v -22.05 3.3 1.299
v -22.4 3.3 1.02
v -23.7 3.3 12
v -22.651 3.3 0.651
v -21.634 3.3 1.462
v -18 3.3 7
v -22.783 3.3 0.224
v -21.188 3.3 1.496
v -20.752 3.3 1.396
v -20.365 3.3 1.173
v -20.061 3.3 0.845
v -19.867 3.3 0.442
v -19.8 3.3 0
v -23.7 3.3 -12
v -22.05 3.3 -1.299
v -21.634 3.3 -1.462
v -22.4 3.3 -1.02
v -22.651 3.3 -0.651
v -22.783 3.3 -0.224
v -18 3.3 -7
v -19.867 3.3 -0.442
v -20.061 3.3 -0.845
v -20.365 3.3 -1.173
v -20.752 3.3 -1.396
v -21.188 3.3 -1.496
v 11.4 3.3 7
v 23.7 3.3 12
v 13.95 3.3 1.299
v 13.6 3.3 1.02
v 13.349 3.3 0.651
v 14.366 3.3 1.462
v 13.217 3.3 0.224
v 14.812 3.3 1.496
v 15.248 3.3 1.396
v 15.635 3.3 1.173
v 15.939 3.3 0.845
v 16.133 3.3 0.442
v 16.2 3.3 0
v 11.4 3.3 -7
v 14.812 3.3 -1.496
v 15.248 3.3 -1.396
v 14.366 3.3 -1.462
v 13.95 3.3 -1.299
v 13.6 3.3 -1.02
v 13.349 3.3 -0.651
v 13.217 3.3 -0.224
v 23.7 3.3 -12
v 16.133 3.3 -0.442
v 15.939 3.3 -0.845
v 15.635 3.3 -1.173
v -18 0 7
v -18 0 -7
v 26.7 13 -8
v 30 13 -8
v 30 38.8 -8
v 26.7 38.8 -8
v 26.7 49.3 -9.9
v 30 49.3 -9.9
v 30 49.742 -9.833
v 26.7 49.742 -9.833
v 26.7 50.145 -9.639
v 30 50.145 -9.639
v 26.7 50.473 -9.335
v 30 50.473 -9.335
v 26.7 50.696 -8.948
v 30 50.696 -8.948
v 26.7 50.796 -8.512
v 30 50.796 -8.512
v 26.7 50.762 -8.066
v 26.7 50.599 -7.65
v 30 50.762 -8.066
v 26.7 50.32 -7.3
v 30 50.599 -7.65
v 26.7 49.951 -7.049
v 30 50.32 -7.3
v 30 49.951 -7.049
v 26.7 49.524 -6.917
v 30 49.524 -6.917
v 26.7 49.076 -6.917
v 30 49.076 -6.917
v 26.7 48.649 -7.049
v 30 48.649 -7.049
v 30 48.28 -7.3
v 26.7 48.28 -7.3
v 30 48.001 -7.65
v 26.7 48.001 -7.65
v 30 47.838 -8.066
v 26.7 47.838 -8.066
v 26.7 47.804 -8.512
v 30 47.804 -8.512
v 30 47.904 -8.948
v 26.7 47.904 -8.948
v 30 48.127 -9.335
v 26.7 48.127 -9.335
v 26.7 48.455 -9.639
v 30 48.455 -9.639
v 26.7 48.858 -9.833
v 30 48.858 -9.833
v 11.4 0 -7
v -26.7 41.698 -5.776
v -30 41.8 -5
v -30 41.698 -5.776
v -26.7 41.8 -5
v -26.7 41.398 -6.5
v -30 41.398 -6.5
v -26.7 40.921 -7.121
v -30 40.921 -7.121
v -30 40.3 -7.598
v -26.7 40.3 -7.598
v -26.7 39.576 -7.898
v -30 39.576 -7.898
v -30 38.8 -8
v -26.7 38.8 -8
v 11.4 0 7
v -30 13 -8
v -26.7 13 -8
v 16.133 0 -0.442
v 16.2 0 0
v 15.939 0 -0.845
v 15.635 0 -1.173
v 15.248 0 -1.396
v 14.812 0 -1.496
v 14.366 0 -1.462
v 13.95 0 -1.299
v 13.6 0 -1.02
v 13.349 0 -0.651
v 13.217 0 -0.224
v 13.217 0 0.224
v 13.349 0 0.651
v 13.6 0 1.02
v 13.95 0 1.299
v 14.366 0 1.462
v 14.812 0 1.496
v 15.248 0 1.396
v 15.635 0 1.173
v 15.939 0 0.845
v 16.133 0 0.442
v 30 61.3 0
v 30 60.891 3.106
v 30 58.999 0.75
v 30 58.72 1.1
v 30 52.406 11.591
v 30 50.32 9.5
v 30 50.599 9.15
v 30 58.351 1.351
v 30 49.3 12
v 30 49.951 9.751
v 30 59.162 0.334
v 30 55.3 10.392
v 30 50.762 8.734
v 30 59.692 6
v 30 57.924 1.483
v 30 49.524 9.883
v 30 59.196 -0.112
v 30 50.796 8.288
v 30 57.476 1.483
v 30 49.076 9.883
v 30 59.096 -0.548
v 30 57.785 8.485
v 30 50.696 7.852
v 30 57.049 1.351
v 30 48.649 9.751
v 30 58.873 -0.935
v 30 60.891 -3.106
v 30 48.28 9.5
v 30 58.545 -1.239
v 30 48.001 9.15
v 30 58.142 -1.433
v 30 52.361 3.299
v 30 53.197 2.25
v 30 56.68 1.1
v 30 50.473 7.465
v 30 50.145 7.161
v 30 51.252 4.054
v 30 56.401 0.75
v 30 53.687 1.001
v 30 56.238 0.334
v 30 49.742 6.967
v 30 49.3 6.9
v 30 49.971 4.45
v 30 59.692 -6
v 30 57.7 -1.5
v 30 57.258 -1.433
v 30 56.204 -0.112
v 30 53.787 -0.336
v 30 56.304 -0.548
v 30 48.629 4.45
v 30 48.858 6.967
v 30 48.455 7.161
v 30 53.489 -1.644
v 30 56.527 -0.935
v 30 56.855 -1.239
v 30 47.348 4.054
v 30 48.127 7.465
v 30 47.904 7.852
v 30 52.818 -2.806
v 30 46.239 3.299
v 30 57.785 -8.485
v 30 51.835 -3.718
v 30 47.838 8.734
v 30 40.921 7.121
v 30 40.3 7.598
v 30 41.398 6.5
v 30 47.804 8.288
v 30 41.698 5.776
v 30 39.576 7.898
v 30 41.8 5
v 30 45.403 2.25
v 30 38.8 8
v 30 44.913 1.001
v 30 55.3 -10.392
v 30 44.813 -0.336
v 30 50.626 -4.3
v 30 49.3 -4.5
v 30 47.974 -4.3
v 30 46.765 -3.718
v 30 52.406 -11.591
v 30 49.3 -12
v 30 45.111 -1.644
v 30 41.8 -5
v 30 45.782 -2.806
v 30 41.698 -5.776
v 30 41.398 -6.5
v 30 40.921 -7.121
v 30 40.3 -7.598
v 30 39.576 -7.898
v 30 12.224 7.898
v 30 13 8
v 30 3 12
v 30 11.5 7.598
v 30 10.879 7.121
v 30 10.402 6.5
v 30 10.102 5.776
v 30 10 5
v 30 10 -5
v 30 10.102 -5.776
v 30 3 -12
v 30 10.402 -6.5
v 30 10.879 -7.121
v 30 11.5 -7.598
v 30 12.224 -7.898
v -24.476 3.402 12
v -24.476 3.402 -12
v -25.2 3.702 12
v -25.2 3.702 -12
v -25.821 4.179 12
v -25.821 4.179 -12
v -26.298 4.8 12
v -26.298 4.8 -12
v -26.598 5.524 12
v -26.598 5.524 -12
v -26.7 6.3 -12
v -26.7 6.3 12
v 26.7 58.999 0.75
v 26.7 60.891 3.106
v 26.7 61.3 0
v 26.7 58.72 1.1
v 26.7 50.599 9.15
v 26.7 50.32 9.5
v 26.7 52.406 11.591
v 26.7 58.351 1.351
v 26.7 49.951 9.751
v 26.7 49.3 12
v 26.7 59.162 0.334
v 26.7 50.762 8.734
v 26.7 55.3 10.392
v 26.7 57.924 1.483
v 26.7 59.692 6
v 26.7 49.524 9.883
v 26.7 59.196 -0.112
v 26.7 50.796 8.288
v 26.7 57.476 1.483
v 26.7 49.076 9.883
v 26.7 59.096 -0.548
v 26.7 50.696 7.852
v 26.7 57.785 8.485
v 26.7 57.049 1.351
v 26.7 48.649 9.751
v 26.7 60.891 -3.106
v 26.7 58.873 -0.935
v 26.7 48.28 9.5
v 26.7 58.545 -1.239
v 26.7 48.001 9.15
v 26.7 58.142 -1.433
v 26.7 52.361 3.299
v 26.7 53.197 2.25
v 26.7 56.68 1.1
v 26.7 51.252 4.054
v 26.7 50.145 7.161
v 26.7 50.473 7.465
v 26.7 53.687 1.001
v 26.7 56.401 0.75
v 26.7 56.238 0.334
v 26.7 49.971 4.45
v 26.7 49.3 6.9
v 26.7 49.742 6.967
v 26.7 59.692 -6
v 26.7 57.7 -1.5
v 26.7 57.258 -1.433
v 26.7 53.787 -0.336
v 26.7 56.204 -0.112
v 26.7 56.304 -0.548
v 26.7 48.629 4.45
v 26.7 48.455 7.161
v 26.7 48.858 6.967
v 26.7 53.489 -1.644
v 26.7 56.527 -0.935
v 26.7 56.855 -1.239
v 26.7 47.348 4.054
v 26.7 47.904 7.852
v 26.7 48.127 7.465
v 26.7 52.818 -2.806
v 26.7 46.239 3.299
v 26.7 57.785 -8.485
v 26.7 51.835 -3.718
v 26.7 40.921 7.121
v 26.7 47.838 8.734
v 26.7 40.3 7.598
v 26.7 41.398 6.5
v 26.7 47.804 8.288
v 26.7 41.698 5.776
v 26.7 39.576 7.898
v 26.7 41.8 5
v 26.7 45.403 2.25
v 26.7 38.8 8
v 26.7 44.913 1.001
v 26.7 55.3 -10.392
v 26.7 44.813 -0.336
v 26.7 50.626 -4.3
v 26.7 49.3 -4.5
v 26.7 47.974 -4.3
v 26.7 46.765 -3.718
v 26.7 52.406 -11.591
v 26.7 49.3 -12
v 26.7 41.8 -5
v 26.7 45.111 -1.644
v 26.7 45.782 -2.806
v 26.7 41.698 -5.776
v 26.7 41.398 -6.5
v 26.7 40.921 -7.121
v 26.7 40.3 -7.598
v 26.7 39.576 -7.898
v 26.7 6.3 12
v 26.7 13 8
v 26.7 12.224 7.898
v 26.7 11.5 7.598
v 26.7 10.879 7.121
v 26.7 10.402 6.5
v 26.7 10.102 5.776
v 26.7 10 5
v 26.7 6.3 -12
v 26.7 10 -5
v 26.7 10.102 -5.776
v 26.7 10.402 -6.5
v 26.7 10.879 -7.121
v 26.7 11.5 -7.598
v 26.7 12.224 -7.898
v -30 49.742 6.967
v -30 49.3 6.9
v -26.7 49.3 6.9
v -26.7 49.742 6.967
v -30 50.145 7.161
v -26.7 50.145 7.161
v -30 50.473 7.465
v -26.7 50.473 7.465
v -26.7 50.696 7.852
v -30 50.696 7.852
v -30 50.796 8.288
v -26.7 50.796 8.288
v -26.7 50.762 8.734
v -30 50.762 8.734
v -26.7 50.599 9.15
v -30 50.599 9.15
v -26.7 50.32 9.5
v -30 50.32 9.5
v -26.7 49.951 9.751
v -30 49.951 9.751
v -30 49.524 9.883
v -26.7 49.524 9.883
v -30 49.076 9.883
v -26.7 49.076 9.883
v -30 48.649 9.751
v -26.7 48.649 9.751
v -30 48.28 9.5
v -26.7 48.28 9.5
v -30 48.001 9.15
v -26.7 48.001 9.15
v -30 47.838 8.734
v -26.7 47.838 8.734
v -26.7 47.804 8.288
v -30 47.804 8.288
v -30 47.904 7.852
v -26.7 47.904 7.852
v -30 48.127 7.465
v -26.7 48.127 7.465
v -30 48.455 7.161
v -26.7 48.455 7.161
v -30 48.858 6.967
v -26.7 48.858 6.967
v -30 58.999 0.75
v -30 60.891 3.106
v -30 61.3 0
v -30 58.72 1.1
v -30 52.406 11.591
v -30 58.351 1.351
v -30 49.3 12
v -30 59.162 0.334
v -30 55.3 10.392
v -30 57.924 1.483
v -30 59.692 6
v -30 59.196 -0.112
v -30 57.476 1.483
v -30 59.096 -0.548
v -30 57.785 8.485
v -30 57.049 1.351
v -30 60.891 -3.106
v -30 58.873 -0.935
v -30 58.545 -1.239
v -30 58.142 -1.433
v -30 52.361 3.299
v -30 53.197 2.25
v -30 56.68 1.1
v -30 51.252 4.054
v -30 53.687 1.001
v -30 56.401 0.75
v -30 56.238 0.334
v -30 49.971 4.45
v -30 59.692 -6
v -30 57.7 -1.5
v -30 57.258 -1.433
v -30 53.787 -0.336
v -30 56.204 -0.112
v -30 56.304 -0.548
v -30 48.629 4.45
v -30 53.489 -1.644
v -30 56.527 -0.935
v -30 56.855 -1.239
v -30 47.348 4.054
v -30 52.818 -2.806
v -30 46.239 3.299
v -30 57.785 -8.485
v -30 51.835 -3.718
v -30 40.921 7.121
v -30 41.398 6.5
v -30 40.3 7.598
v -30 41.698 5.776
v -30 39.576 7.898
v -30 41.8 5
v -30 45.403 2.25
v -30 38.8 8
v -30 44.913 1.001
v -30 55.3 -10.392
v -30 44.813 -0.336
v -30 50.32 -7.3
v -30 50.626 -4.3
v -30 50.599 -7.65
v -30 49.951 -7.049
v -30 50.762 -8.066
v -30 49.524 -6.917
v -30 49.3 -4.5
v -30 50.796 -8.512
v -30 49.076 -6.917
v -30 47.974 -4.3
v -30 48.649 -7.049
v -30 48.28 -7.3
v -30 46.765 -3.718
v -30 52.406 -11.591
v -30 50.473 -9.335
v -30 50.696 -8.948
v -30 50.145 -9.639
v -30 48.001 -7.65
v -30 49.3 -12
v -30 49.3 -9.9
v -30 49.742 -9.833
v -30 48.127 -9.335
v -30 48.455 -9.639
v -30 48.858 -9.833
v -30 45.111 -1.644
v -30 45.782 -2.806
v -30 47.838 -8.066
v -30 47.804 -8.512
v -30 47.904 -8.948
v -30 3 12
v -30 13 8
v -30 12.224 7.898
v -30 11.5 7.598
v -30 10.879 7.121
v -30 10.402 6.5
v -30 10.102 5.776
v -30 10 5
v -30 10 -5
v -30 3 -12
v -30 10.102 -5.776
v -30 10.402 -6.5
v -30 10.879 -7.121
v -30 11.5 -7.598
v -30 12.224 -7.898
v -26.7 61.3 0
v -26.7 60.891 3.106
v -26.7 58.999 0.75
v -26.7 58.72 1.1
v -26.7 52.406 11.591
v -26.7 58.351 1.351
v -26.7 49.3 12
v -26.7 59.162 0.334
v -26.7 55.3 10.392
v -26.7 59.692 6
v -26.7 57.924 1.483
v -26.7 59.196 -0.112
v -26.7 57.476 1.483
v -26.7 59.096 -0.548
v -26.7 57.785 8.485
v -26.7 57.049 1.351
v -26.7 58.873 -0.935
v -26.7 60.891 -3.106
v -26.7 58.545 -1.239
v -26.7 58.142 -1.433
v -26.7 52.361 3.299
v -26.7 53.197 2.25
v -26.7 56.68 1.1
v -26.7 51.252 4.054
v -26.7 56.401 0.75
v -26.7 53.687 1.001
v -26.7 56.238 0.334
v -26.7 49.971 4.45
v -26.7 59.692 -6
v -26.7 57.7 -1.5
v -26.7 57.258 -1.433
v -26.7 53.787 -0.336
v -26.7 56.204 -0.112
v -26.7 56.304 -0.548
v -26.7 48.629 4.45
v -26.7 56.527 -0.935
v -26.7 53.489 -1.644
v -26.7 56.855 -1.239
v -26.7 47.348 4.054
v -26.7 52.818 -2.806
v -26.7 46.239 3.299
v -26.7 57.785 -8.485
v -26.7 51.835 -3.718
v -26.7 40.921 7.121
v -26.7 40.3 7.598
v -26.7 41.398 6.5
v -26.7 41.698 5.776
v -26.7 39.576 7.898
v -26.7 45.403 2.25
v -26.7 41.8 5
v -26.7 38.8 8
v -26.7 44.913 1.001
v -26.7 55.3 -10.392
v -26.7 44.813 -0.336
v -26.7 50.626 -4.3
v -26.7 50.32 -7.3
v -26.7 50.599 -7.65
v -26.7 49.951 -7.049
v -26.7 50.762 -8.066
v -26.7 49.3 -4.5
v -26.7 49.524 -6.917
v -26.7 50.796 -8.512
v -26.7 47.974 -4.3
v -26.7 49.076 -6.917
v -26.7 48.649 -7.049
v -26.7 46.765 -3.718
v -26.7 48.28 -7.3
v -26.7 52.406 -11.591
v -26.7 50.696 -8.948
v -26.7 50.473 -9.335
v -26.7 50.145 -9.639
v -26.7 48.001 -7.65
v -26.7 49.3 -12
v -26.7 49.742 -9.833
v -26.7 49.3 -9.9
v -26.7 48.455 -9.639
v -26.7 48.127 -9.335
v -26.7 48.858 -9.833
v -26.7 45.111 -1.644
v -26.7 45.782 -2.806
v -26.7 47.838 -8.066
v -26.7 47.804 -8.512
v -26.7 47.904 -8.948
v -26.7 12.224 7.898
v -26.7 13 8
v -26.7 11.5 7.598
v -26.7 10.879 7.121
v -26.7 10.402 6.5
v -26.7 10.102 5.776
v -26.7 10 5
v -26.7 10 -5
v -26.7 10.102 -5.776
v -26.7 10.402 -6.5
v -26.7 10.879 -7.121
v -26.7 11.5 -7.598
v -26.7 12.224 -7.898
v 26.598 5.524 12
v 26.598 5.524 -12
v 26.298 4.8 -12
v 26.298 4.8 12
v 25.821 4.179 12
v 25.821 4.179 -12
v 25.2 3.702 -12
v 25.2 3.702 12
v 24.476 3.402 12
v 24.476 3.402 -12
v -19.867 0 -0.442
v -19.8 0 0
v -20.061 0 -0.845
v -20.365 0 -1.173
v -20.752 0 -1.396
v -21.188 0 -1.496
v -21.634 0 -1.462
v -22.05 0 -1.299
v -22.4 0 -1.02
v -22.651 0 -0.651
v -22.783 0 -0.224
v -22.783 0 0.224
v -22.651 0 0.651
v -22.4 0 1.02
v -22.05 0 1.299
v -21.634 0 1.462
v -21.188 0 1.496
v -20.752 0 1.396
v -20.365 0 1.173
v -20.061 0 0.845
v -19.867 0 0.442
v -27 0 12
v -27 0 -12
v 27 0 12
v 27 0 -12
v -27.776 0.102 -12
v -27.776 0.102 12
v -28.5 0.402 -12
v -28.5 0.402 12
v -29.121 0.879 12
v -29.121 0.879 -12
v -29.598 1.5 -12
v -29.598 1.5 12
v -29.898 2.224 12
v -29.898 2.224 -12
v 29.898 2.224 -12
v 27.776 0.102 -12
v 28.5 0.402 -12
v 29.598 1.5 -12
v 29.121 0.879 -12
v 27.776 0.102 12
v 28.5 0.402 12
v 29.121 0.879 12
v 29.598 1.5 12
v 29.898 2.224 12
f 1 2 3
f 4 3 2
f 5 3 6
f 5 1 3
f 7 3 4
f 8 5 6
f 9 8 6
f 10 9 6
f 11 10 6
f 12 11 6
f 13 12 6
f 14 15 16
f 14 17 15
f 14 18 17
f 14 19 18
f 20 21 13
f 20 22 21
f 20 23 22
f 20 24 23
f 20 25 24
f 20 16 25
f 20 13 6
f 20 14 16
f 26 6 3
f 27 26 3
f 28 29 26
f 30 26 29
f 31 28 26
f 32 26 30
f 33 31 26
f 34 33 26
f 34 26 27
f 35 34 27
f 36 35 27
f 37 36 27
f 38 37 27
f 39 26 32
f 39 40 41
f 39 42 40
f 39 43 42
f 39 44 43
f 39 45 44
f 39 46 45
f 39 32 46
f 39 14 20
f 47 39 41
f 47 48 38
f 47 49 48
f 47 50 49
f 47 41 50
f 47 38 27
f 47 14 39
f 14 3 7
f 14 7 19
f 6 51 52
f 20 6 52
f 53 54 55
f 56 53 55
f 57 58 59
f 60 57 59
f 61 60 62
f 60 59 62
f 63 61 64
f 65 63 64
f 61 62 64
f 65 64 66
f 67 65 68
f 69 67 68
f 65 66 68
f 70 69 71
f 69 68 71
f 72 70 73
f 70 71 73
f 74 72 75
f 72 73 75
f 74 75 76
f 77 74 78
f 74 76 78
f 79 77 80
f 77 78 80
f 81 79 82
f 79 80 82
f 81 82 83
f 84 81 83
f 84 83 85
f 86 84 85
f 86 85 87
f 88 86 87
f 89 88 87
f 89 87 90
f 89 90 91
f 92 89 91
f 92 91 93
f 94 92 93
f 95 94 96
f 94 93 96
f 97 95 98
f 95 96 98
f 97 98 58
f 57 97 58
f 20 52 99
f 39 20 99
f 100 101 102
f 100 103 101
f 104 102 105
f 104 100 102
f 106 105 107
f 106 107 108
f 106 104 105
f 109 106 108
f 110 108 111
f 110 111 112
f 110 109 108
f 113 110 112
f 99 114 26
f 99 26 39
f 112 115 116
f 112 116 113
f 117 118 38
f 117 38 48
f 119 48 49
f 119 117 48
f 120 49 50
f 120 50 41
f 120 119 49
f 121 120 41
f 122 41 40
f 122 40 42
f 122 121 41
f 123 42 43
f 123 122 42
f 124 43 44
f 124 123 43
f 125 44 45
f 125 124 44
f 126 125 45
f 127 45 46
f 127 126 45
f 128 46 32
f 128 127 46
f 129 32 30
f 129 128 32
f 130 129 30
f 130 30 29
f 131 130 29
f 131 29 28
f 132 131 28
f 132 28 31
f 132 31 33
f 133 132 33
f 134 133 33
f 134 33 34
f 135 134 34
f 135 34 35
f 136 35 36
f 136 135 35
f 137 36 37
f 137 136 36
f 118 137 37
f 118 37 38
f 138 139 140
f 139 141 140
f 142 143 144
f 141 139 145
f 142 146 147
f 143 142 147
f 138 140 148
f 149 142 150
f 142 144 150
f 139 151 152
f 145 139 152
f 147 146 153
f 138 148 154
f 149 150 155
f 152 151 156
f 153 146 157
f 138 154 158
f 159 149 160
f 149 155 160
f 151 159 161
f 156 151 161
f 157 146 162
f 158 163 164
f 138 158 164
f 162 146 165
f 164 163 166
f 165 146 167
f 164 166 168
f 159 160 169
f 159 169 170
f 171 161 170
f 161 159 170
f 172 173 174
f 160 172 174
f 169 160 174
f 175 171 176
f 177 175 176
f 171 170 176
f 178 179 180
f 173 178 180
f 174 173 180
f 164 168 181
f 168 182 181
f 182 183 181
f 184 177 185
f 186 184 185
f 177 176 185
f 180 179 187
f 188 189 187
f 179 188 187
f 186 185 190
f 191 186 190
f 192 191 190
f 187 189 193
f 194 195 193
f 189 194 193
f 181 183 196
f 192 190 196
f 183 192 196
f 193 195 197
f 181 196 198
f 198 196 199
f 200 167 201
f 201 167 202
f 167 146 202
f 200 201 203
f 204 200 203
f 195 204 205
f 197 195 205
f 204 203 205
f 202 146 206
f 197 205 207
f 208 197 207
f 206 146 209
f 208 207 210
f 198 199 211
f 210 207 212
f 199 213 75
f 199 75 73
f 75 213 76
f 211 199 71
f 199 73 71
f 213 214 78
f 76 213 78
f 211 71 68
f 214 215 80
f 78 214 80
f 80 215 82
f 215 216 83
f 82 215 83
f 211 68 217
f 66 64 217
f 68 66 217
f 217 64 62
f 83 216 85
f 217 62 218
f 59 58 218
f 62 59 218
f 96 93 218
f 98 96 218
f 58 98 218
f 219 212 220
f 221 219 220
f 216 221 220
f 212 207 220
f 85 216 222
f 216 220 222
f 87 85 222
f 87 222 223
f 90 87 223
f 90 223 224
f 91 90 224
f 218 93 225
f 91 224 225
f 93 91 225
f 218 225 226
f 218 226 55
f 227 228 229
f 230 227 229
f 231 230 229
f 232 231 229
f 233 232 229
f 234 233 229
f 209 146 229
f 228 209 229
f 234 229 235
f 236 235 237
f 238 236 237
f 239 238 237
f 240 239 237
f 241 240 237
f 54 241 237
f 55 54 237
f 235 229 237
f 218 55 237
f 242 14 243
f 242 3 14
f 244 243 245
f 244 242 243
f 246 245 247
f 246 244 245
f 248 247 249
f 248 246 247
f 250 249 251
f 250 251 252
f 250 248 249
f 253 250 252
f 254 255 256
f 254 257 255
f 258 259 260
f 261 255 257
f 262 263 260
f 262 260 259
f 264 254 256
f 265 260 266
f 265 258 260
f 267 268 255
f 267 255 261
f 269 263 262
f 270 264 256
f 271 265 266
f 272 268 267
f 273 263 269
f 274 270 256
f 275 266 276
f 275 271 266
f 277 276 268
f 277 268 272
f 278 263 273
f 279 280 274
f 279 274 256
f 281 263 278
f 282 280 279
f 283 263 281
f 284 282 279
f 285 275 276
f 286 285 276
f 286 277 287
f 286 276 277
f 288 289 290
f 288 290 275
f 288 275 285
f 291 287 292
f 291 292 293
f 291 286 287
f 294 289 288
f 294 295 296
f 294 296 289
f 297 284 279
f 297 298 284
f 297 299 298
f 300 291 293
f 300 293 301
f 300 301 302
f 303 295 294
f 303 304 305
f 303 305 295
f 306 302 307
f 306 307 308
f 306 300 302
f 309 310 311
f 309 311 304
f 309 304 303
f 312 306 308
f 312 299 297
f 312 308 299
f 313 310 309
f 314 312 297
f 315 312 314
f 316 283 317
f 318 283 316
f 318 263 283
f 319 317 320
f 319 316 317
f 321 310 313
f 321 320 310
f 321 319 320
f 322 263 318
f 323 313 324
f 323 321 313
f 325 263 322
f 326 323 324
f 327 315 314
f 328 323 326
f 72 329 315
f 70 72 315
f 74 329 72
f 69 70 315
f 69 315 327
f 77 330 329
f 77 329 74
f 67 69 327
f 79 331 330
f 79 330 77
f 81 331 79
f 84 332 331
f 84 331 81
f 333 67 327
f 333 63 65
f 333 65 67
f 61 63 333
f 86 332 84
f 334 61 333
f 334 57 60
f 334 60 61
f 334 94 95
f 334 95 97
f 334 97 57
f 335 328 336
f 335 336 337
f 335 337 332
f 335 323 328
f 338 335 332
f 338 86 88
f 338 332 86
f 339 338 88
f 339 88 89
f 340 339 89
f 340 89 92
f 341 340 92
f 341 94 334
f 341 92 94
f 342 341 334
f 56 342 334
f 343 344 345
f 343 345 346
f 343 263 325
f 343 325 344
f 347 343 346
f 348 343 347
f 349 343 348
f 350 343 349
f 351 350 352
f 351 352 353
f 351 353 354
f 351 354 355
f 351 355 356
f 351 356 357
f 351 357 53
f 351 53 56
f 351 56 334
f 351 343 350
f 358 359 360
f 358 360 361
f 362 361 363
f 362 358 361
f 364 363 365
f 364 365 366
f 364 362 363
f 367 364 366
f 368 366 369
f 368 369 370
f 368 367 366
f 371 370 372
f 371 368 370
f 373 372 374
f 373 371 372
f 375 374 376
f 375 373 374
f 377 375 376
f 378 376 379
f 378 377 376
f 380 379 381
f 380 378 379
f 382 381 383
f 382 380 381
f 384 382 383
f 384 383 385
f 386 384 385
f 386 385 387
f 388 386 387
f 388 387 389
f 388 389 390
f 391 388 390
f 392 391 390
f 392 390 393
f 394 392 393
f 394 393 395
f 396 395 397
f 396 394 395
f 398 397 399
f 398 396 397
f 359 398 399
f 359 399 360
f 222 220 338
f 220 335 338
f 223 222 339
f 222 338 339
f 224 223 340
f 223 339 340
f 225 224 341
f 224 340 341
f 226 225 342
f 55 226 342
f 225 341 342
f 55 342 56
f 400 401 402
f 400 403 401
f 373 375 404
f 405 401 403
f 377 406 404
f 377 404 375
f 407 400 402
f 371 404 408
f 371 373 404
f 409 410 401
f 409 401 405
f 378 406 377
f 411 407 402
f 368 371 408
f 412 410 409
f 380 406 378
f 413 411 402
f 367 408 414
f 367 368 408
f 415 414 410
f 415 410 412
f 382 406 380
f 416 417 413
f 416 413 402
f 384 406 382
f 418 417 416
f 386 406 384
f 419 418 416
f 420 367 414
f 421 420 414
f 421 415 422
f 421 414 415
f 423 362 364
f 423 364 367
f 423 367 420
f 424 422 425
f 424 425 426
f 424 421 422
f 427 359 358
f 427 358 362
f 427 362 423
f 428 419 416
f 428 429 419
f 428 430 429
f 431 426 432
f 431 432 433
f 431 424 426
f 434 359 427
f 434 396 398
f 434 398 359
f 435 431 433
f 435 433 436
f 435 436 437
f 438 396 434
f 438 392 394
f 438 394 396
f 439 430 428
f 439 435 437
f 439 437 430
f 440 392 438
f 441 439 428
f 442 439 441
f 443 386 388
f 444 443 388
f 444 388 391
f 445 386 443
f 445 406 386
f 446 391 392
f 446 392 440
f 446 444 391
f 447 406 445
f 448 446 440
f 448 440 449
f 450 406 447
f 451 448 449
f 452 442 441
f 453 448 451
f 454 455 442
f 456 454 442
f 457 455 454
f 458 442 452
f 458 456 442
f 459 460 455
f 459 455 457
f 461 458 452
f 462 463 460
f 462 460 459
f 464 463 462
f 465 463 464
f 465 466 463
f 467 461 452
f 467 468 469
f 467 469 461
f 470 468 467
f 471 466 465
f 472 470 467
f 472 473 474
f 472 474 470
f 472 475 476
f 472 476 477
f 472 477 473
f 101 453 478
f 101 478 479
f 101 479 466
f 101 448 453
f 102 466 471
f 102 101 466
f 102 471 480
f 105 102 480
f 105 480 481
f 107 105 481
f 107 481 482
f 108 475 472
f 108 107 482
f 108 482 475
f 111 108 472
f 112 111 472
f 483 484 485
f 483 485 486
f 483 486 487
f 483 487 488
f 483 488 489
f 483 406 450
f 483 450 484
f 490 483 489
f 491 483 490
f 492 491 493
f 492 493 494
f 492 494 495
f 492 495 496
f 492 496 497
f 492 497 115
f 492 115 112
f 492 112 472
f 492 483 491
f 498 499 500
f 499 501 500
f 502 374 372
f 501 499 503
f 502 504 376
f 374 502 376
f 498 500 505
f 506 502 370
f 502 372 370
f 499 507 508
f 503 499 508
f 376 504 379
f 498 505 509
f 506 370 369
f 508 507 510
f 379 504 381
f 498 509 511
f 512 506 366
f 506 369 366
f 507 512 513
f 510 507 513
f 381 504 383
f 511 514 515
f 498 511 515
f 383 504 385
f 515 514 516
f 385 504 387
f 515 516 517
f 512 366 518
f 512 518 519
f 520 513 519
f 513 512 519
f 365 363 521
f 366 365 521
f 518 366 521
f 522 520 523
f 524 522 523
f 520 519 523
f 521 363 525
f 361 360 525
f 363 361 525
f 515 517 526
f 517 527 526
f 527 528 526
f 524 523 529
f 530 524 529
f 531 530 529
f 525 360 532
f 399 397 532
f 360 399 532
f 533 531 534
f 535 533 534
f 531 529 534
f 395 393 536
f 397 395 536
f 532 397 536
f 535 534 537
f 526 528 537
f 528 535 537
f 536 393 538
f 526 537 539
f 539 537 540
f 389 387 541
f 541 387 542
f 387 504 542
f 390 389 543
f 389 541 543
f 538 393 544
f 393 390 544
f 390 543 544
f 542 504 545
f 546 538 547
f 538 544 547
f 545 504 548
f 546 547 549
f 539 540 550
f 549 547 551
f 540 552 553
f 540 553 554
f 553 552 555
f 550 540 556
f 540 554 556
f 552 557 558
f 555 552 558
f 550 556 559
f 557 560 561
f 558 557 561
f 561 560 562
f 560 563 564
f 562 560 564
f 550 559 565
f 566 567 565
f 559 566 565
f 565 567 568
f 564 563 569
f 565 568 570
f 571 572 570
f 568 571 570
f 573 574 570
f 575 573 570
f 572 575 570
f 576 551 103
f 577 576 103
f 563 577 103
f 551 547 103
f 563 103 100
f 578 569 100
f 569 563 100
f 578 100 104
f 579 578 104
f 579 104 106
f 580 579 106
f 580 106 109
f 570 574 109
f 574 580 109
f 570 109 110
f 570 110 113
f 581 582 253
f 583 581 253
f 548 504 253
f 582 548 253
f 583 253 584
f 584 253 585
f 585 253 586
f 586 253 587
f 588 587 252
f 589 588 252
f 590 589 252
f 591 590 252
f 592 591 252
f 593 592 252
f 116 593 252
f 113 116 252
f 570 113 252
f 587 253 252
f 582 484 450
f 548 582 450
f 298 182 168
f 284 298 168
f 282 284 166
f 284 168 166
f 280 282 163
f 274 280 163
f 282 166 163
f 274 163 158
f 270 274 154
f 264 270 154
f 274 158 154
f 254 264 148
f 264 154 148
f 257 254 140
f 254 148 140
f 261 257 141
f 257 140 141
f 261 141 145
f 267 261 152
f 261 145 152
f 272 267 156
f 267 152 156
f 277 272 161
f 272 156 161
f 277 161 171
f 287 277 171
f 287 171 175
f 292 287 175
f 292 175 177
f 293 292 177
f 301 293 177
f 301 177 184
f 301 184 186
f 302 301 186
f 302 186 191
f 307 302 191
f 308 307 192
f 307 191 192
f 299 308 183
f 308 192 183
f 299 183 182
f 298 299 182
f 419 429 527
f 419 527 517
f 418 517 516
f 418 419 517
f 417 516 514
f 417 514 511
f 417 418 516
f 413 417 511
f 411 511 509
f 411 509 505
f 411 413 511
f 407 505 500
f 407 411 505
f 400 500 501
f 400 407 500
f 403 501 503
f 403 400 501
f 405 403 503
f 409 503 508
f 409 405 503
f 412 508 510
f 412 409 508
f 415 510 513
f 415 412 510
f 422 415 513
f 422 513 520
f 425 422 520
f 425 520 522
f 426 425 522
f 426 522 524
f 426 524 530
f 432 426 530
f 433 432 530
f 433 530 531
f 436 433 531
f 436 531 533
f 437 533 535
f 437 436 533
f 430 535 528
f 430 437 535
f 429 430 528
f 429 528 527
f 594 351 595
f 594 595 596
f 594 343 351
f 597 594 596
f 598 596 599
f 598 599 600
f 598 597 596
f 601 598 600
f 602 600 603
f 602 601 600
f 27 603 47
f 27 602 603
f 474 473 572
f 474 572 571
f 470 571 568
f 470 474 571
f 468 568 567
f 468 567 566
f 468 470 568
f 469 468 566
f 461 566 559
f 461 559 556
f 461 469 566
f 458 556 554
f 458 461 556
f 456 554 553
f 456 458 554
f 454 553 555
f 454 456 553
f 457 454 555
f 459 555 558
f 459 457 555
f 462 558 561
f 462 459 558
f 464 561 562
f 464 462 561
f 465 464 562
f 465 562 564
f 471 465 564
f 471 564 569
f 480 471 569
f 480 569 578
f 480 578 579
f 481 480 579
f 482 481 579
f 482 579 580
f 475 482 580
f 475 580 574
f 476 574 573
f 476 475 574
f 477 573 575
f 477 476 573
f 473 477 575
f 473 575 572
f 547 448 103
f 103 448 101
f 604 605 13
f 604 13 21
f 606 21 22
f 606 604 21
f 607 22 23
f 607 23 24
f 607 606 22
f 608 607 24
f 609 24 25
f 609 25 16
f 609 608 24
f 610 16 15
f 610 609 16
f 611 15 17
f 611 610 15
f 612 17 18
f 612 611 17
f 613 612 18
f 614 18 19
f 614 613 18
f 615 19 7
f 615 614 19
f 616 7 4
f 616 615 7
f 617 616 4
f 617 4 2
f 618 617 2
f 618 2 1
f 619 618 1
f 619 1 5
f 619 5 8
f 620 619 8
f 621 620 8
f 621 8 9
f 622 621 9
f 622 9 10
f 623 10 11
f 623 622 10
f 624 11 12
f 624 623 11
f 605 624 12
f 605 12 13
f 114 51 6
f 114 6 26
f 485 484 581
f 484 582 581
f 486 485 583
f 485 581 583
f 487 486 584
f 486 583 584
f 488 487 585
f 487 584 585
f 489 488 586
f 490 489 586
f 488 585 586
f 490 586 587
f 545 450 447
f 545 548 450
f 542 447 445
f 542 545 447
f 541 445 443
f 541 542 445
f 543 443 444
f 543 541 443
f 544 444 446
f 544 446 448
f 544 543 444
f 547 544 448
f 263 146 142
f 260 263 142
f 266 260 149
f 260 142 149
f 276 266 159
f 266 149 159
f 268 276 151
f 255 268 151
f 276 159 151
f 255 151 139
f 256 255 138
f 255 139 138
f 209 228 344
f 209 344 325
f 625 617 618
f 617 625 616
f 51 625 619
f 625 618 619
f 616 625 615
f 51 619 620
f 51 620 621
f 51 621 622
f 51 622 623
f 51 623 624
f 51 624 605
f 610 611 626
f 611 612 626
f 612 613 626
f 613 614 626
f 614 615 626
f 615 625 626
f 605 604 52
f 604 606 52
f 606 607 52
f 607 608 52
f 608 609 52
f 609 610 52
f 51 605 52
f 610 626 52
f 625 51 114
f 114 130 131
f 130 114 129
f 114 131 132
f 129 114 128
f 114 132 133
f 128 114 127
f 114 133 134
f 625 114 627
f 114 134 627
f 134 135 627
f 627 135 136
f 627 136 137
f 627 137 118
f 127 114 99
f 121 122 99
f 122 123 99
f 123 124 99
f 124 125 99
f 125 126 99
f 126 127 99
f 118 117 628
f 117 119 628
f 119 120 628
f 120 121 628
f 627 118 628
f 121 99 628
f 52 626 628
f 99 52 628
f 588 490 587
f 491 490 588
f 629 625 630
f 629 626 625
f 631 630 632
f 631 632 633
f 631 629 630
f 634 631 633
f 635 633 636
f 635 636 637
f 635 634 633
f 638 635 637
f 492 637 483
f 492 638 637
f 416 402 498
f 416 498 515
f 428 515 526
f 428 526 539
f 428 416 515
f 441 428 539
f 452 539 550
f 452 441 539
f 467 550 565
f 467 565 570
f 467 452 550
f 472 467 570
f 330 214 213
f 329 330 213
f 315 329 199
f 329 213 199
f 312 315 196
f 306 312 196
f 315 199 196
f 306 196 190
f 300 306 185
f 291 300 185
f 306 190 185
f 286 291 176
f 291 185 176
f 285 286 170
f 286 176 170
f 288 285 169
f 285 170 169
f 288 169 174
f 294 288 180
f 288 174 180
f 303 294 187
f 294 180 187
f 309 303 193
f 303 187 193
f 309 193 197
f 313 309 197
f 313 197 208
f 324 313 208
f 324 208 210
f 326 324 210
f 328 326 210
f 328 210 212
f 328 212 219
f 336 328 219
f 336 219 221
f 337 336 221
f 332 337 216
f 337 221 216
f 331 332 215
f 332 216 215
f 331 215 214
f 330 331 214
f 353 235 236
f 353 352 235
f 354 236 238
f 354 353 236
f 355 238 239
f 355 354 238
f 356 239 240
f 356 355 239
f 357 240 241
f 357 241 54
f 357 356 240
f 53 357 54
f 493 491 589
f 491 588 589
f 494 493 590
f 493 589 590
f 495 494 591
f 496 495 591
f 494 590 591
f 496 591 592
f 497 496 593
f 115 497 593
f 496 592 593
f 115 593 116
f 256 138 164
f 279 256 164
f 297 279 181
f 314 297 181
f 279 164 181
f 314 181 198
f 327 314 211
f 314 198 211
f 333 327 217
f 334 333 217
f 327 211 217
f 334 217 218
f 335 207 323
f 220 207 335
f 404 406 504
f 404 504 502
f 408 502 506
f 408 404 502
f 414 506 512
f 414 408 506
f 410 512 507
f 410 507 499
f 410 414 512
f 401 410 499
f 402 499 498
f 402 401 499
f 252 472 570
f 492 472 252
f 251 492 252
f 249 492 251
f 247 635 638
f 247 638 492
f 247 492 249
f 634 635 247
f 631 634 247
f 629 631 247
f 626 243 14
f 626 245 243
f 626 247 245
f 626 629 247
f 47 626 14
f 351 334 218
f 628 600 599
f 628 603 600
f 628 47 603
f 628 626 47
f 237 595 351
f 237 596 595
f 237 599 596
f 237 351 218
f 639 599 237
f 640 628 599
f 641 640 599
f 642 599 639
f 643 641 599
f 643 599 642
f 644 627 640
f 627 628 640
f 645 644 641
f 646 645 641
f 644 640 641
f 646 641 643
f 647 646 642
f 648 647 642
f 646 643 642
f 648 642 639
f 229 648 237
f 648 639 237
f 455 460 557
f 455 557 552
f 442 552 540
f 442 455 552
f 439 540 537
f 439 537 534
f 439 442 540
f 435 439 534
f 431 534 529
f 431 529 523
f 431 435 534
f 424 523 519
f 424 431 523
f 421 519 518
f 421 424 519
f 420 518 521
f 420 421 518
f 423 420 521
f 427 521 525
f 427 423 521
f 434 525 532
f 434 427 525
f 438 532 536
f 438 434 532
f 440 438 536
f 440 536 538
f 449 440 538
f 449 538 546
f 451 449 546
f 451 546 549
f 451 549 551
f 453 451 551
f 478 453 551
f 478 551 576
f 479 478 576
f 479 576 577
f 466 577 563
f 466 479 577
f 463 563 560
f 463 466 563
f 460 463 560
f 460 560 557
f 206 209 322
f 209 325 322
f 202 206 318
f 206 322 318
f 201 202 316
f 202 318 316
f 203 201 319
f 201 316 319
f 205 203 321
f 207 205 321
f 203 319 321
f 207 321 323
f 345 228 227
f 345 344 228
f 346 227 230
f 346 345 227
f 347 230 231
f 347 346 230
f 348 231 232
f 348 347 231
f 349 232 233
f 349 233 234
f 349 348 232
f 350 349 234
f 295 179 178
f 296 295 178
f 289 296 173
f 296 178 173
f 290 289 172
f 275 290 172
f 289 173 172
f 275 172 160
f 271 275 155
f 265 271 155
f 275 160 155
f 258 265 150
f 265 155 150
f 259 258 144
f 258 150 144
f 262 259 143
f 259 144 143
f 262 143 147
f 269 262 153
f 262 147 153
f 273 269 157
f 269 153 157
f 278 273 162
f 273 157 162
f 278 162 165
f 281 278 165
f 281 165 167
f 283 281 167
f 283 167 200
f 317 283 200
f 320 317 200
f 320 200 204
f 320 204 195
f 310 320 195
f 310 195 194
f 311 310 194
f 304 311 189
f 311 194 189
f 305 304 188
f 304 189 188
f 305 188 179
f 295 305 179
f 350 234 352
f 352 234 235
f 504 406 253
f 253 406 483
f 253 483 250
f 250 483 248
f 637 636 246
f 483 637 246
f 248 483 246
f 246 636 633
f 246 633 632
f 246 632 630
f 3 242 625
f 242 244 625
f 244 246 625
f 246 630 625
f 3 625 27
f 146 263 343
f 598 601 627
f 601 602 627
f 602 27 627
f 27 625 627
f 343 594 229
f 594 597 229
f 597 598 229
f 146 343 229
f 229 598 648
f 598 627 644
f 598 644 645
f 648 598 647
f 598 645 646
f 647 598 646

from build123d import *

# Parameters (mm, degrees)
SKETCH1_W           = 60
SKETCH1_H           = 24
BOSS_EXTRUDE1_DEPTH = 3.3
SKETCH2_W           = 3.3
SKETCH2_H           = 24
BOSS_EXTRUDE2_DEPTH = 61.3
SKETCH3_W           = 16
SKETCH3_H           = 31.8
CUT_EXTRUDE1_DEPTH  = 3.3
CUT_EXTRUDE2_DEPTH  = 3.3
SKETCH5_R           = 4.5
SKETCH5_R_2         = 1.5
CUT_EXTRUDE3_DEPTH  = 3.3
SKETCH7_R           = 1.5
SKETCH7_W           = 29.4
SKETCH7_H           = 14
CUT_EXTRUDE4_DEPTH  = 3.3
FILLET1_R           = 3


with BuildPart() as part:
    # Sketch1 → Boss-Extrude1 (new body)
    with BuildSketch(Plane(origin=(0, 0, 0), x_dir=(1, 0, 0), z_dir=(0, 1, 0))):
        Rectangle(SKETCH1_W, SKETCH1_H)
    extrude(amount=BOSS_EXTRUDE1_DEPTH)

    # Sketch2 → Boss-Extrude2 (add)
    with BuildSketch(Plane(origin=(0, 0, 0), x_dir=(1, 0, 0), z_dir=(0, 1, 0))):
        with Locations((28.35, 0)):
            Rectangle(SKETCH2_W, SKETCH2_H)
    boss_extrude2 = extrude(amount=BOSS_EXTRUDE2_DEPTH)

    # Sketch3 → Cut-Extrude1 (cut)
    with BuildSketch(Plane(origin=(30, 0, 0), x_dir=(0, 0, -1), z_dir=(1, 0, 0))):
        with Locations((0, 25.9)):
            Rectangle(SKETCH3_W, SKETCH3_H)
    cut_extrude1 = extrude(amount=-CUT_EXTRUDE1_DEPTH, mode=Mode.SUBTRACT)

    # Sketch4 → Cut-Extrude2 (cut)
    with BuildSketch(Plane(origin=(30, 0, 0), x_dir=(0, 0, -1), z_dir=(1, 0, 0))):
        with BuildLine():
            ThreePointArc((2.4e-08, 61.3), (8.485281383, 57.785281366), (12, 49.3))
            Line((12, 49.3), (12, 61.3))
            Line((12, 61.3), (2.4e-08, 61.3))
        make_face()
        with BuildLine():
            ThreePointArc((-12, 49.3), (-8.485281366, 57.785281383), (2.4e-08, 61.3))
            Line((2.4e-08, 61.3), (-12, 61.3))
            Line((-12, 61.3), (-12, 49.3))
        make_face()
    cut_extrude2 = extrude(amount=-CUT_EXTRUDE2_DEPTH, mode=Mode.SUBTRACT)

    # Sketch5 → Cut-Extrude3 (cut)
    with BuildSketch(Plane(origin=(30, 0, 0), x_dir=(0, 0, -1), z_dir=(1, 0, 0))):
        with Locations((0, 49.3)):
            Circle(SKETCH5_R)
        with Locations((8.4, 49.3)):
            Circle(SKETCH5_R_2)
        with Locations((0, 57.7)):
            Circle(SKETCH5_R_2)
        with Locations((-8.4, 49.3)):
            Circle(SKETCH5_R_2)
    cut_extrude3 = extrude(amount=-CUT_EXTRUDE3_DEPTH, mode=Mode.SUBTRACT)

    # Sketch7 → Cut-Extrude4 (cut)
    with BuildSketch(Plane(origin=(0, 0, 0), x_dir=(1, 0, 0), z_dir=(0, 1, 0))):
        with Locations((-21.3, 0)):
            Circle(SKETCH7_R)
        with Locations((14.7, 0)):
            Circle(SKETCH7_R)
        with Locations((-3.3, 0)):
            Rectangle(SKETCH7_W, SKETCH7_H)
    extrude(amount=CUT_EXTRUDE4_DEPTH, mode=Mode.SUBTRACT)

    # Mirror2: Boss-Extrude2, Cut-Extrude1, Cut-Extrude2, Cut-Extrude3 across plane
    add(boss_extrude2.mirror(Plane(origin=(0, 0, 0), x_dir=(0, 0, 1), z_dir=(1, 0, 0))))
    add(cut_extrude1.mirror(Plane(origin=(0, 0, 0), x_dir=(0, 0, 1), z_dir=(1, 0, 0))), mode=Mode.SUBTRACT)
    add(cut_extrude2.mirror(Plane(origin=(0, 0, 0), x_dir=(0, 0, 1), z_dir=(1, 0, 0))), mode=Mode.SUBTRACT)
    add(cut_extrude3.mirror(Plane(origin=(0, 0, 0), x_dir=(0, 0, 1), z_dir=(1, 0, 0))), mode=Mode.SUBTRACT)

    # Fillet1
    fillet1_edges = [part.edges().sort_by_distance(p)[0] for p in [
        (-26.7, 3.3, 0),
        (-28.35, 10, 8),
        (-28.35, 41.8, 8),
        (-28.35, 41.8, -8),
        (-28.35, 10, -8),
        (26.7, 3.3, 0),
        (28.35, 41.8, -8),
        (28.35, 10, -8),
        (28.35, 10, 8),
        (28.35, 41.8, 8),
        (-30, 0, 0),
        (30, 0, 0),
    ]]
    fillet(fillet1_edges, radius=FILLET1_R)


solid = part.part
